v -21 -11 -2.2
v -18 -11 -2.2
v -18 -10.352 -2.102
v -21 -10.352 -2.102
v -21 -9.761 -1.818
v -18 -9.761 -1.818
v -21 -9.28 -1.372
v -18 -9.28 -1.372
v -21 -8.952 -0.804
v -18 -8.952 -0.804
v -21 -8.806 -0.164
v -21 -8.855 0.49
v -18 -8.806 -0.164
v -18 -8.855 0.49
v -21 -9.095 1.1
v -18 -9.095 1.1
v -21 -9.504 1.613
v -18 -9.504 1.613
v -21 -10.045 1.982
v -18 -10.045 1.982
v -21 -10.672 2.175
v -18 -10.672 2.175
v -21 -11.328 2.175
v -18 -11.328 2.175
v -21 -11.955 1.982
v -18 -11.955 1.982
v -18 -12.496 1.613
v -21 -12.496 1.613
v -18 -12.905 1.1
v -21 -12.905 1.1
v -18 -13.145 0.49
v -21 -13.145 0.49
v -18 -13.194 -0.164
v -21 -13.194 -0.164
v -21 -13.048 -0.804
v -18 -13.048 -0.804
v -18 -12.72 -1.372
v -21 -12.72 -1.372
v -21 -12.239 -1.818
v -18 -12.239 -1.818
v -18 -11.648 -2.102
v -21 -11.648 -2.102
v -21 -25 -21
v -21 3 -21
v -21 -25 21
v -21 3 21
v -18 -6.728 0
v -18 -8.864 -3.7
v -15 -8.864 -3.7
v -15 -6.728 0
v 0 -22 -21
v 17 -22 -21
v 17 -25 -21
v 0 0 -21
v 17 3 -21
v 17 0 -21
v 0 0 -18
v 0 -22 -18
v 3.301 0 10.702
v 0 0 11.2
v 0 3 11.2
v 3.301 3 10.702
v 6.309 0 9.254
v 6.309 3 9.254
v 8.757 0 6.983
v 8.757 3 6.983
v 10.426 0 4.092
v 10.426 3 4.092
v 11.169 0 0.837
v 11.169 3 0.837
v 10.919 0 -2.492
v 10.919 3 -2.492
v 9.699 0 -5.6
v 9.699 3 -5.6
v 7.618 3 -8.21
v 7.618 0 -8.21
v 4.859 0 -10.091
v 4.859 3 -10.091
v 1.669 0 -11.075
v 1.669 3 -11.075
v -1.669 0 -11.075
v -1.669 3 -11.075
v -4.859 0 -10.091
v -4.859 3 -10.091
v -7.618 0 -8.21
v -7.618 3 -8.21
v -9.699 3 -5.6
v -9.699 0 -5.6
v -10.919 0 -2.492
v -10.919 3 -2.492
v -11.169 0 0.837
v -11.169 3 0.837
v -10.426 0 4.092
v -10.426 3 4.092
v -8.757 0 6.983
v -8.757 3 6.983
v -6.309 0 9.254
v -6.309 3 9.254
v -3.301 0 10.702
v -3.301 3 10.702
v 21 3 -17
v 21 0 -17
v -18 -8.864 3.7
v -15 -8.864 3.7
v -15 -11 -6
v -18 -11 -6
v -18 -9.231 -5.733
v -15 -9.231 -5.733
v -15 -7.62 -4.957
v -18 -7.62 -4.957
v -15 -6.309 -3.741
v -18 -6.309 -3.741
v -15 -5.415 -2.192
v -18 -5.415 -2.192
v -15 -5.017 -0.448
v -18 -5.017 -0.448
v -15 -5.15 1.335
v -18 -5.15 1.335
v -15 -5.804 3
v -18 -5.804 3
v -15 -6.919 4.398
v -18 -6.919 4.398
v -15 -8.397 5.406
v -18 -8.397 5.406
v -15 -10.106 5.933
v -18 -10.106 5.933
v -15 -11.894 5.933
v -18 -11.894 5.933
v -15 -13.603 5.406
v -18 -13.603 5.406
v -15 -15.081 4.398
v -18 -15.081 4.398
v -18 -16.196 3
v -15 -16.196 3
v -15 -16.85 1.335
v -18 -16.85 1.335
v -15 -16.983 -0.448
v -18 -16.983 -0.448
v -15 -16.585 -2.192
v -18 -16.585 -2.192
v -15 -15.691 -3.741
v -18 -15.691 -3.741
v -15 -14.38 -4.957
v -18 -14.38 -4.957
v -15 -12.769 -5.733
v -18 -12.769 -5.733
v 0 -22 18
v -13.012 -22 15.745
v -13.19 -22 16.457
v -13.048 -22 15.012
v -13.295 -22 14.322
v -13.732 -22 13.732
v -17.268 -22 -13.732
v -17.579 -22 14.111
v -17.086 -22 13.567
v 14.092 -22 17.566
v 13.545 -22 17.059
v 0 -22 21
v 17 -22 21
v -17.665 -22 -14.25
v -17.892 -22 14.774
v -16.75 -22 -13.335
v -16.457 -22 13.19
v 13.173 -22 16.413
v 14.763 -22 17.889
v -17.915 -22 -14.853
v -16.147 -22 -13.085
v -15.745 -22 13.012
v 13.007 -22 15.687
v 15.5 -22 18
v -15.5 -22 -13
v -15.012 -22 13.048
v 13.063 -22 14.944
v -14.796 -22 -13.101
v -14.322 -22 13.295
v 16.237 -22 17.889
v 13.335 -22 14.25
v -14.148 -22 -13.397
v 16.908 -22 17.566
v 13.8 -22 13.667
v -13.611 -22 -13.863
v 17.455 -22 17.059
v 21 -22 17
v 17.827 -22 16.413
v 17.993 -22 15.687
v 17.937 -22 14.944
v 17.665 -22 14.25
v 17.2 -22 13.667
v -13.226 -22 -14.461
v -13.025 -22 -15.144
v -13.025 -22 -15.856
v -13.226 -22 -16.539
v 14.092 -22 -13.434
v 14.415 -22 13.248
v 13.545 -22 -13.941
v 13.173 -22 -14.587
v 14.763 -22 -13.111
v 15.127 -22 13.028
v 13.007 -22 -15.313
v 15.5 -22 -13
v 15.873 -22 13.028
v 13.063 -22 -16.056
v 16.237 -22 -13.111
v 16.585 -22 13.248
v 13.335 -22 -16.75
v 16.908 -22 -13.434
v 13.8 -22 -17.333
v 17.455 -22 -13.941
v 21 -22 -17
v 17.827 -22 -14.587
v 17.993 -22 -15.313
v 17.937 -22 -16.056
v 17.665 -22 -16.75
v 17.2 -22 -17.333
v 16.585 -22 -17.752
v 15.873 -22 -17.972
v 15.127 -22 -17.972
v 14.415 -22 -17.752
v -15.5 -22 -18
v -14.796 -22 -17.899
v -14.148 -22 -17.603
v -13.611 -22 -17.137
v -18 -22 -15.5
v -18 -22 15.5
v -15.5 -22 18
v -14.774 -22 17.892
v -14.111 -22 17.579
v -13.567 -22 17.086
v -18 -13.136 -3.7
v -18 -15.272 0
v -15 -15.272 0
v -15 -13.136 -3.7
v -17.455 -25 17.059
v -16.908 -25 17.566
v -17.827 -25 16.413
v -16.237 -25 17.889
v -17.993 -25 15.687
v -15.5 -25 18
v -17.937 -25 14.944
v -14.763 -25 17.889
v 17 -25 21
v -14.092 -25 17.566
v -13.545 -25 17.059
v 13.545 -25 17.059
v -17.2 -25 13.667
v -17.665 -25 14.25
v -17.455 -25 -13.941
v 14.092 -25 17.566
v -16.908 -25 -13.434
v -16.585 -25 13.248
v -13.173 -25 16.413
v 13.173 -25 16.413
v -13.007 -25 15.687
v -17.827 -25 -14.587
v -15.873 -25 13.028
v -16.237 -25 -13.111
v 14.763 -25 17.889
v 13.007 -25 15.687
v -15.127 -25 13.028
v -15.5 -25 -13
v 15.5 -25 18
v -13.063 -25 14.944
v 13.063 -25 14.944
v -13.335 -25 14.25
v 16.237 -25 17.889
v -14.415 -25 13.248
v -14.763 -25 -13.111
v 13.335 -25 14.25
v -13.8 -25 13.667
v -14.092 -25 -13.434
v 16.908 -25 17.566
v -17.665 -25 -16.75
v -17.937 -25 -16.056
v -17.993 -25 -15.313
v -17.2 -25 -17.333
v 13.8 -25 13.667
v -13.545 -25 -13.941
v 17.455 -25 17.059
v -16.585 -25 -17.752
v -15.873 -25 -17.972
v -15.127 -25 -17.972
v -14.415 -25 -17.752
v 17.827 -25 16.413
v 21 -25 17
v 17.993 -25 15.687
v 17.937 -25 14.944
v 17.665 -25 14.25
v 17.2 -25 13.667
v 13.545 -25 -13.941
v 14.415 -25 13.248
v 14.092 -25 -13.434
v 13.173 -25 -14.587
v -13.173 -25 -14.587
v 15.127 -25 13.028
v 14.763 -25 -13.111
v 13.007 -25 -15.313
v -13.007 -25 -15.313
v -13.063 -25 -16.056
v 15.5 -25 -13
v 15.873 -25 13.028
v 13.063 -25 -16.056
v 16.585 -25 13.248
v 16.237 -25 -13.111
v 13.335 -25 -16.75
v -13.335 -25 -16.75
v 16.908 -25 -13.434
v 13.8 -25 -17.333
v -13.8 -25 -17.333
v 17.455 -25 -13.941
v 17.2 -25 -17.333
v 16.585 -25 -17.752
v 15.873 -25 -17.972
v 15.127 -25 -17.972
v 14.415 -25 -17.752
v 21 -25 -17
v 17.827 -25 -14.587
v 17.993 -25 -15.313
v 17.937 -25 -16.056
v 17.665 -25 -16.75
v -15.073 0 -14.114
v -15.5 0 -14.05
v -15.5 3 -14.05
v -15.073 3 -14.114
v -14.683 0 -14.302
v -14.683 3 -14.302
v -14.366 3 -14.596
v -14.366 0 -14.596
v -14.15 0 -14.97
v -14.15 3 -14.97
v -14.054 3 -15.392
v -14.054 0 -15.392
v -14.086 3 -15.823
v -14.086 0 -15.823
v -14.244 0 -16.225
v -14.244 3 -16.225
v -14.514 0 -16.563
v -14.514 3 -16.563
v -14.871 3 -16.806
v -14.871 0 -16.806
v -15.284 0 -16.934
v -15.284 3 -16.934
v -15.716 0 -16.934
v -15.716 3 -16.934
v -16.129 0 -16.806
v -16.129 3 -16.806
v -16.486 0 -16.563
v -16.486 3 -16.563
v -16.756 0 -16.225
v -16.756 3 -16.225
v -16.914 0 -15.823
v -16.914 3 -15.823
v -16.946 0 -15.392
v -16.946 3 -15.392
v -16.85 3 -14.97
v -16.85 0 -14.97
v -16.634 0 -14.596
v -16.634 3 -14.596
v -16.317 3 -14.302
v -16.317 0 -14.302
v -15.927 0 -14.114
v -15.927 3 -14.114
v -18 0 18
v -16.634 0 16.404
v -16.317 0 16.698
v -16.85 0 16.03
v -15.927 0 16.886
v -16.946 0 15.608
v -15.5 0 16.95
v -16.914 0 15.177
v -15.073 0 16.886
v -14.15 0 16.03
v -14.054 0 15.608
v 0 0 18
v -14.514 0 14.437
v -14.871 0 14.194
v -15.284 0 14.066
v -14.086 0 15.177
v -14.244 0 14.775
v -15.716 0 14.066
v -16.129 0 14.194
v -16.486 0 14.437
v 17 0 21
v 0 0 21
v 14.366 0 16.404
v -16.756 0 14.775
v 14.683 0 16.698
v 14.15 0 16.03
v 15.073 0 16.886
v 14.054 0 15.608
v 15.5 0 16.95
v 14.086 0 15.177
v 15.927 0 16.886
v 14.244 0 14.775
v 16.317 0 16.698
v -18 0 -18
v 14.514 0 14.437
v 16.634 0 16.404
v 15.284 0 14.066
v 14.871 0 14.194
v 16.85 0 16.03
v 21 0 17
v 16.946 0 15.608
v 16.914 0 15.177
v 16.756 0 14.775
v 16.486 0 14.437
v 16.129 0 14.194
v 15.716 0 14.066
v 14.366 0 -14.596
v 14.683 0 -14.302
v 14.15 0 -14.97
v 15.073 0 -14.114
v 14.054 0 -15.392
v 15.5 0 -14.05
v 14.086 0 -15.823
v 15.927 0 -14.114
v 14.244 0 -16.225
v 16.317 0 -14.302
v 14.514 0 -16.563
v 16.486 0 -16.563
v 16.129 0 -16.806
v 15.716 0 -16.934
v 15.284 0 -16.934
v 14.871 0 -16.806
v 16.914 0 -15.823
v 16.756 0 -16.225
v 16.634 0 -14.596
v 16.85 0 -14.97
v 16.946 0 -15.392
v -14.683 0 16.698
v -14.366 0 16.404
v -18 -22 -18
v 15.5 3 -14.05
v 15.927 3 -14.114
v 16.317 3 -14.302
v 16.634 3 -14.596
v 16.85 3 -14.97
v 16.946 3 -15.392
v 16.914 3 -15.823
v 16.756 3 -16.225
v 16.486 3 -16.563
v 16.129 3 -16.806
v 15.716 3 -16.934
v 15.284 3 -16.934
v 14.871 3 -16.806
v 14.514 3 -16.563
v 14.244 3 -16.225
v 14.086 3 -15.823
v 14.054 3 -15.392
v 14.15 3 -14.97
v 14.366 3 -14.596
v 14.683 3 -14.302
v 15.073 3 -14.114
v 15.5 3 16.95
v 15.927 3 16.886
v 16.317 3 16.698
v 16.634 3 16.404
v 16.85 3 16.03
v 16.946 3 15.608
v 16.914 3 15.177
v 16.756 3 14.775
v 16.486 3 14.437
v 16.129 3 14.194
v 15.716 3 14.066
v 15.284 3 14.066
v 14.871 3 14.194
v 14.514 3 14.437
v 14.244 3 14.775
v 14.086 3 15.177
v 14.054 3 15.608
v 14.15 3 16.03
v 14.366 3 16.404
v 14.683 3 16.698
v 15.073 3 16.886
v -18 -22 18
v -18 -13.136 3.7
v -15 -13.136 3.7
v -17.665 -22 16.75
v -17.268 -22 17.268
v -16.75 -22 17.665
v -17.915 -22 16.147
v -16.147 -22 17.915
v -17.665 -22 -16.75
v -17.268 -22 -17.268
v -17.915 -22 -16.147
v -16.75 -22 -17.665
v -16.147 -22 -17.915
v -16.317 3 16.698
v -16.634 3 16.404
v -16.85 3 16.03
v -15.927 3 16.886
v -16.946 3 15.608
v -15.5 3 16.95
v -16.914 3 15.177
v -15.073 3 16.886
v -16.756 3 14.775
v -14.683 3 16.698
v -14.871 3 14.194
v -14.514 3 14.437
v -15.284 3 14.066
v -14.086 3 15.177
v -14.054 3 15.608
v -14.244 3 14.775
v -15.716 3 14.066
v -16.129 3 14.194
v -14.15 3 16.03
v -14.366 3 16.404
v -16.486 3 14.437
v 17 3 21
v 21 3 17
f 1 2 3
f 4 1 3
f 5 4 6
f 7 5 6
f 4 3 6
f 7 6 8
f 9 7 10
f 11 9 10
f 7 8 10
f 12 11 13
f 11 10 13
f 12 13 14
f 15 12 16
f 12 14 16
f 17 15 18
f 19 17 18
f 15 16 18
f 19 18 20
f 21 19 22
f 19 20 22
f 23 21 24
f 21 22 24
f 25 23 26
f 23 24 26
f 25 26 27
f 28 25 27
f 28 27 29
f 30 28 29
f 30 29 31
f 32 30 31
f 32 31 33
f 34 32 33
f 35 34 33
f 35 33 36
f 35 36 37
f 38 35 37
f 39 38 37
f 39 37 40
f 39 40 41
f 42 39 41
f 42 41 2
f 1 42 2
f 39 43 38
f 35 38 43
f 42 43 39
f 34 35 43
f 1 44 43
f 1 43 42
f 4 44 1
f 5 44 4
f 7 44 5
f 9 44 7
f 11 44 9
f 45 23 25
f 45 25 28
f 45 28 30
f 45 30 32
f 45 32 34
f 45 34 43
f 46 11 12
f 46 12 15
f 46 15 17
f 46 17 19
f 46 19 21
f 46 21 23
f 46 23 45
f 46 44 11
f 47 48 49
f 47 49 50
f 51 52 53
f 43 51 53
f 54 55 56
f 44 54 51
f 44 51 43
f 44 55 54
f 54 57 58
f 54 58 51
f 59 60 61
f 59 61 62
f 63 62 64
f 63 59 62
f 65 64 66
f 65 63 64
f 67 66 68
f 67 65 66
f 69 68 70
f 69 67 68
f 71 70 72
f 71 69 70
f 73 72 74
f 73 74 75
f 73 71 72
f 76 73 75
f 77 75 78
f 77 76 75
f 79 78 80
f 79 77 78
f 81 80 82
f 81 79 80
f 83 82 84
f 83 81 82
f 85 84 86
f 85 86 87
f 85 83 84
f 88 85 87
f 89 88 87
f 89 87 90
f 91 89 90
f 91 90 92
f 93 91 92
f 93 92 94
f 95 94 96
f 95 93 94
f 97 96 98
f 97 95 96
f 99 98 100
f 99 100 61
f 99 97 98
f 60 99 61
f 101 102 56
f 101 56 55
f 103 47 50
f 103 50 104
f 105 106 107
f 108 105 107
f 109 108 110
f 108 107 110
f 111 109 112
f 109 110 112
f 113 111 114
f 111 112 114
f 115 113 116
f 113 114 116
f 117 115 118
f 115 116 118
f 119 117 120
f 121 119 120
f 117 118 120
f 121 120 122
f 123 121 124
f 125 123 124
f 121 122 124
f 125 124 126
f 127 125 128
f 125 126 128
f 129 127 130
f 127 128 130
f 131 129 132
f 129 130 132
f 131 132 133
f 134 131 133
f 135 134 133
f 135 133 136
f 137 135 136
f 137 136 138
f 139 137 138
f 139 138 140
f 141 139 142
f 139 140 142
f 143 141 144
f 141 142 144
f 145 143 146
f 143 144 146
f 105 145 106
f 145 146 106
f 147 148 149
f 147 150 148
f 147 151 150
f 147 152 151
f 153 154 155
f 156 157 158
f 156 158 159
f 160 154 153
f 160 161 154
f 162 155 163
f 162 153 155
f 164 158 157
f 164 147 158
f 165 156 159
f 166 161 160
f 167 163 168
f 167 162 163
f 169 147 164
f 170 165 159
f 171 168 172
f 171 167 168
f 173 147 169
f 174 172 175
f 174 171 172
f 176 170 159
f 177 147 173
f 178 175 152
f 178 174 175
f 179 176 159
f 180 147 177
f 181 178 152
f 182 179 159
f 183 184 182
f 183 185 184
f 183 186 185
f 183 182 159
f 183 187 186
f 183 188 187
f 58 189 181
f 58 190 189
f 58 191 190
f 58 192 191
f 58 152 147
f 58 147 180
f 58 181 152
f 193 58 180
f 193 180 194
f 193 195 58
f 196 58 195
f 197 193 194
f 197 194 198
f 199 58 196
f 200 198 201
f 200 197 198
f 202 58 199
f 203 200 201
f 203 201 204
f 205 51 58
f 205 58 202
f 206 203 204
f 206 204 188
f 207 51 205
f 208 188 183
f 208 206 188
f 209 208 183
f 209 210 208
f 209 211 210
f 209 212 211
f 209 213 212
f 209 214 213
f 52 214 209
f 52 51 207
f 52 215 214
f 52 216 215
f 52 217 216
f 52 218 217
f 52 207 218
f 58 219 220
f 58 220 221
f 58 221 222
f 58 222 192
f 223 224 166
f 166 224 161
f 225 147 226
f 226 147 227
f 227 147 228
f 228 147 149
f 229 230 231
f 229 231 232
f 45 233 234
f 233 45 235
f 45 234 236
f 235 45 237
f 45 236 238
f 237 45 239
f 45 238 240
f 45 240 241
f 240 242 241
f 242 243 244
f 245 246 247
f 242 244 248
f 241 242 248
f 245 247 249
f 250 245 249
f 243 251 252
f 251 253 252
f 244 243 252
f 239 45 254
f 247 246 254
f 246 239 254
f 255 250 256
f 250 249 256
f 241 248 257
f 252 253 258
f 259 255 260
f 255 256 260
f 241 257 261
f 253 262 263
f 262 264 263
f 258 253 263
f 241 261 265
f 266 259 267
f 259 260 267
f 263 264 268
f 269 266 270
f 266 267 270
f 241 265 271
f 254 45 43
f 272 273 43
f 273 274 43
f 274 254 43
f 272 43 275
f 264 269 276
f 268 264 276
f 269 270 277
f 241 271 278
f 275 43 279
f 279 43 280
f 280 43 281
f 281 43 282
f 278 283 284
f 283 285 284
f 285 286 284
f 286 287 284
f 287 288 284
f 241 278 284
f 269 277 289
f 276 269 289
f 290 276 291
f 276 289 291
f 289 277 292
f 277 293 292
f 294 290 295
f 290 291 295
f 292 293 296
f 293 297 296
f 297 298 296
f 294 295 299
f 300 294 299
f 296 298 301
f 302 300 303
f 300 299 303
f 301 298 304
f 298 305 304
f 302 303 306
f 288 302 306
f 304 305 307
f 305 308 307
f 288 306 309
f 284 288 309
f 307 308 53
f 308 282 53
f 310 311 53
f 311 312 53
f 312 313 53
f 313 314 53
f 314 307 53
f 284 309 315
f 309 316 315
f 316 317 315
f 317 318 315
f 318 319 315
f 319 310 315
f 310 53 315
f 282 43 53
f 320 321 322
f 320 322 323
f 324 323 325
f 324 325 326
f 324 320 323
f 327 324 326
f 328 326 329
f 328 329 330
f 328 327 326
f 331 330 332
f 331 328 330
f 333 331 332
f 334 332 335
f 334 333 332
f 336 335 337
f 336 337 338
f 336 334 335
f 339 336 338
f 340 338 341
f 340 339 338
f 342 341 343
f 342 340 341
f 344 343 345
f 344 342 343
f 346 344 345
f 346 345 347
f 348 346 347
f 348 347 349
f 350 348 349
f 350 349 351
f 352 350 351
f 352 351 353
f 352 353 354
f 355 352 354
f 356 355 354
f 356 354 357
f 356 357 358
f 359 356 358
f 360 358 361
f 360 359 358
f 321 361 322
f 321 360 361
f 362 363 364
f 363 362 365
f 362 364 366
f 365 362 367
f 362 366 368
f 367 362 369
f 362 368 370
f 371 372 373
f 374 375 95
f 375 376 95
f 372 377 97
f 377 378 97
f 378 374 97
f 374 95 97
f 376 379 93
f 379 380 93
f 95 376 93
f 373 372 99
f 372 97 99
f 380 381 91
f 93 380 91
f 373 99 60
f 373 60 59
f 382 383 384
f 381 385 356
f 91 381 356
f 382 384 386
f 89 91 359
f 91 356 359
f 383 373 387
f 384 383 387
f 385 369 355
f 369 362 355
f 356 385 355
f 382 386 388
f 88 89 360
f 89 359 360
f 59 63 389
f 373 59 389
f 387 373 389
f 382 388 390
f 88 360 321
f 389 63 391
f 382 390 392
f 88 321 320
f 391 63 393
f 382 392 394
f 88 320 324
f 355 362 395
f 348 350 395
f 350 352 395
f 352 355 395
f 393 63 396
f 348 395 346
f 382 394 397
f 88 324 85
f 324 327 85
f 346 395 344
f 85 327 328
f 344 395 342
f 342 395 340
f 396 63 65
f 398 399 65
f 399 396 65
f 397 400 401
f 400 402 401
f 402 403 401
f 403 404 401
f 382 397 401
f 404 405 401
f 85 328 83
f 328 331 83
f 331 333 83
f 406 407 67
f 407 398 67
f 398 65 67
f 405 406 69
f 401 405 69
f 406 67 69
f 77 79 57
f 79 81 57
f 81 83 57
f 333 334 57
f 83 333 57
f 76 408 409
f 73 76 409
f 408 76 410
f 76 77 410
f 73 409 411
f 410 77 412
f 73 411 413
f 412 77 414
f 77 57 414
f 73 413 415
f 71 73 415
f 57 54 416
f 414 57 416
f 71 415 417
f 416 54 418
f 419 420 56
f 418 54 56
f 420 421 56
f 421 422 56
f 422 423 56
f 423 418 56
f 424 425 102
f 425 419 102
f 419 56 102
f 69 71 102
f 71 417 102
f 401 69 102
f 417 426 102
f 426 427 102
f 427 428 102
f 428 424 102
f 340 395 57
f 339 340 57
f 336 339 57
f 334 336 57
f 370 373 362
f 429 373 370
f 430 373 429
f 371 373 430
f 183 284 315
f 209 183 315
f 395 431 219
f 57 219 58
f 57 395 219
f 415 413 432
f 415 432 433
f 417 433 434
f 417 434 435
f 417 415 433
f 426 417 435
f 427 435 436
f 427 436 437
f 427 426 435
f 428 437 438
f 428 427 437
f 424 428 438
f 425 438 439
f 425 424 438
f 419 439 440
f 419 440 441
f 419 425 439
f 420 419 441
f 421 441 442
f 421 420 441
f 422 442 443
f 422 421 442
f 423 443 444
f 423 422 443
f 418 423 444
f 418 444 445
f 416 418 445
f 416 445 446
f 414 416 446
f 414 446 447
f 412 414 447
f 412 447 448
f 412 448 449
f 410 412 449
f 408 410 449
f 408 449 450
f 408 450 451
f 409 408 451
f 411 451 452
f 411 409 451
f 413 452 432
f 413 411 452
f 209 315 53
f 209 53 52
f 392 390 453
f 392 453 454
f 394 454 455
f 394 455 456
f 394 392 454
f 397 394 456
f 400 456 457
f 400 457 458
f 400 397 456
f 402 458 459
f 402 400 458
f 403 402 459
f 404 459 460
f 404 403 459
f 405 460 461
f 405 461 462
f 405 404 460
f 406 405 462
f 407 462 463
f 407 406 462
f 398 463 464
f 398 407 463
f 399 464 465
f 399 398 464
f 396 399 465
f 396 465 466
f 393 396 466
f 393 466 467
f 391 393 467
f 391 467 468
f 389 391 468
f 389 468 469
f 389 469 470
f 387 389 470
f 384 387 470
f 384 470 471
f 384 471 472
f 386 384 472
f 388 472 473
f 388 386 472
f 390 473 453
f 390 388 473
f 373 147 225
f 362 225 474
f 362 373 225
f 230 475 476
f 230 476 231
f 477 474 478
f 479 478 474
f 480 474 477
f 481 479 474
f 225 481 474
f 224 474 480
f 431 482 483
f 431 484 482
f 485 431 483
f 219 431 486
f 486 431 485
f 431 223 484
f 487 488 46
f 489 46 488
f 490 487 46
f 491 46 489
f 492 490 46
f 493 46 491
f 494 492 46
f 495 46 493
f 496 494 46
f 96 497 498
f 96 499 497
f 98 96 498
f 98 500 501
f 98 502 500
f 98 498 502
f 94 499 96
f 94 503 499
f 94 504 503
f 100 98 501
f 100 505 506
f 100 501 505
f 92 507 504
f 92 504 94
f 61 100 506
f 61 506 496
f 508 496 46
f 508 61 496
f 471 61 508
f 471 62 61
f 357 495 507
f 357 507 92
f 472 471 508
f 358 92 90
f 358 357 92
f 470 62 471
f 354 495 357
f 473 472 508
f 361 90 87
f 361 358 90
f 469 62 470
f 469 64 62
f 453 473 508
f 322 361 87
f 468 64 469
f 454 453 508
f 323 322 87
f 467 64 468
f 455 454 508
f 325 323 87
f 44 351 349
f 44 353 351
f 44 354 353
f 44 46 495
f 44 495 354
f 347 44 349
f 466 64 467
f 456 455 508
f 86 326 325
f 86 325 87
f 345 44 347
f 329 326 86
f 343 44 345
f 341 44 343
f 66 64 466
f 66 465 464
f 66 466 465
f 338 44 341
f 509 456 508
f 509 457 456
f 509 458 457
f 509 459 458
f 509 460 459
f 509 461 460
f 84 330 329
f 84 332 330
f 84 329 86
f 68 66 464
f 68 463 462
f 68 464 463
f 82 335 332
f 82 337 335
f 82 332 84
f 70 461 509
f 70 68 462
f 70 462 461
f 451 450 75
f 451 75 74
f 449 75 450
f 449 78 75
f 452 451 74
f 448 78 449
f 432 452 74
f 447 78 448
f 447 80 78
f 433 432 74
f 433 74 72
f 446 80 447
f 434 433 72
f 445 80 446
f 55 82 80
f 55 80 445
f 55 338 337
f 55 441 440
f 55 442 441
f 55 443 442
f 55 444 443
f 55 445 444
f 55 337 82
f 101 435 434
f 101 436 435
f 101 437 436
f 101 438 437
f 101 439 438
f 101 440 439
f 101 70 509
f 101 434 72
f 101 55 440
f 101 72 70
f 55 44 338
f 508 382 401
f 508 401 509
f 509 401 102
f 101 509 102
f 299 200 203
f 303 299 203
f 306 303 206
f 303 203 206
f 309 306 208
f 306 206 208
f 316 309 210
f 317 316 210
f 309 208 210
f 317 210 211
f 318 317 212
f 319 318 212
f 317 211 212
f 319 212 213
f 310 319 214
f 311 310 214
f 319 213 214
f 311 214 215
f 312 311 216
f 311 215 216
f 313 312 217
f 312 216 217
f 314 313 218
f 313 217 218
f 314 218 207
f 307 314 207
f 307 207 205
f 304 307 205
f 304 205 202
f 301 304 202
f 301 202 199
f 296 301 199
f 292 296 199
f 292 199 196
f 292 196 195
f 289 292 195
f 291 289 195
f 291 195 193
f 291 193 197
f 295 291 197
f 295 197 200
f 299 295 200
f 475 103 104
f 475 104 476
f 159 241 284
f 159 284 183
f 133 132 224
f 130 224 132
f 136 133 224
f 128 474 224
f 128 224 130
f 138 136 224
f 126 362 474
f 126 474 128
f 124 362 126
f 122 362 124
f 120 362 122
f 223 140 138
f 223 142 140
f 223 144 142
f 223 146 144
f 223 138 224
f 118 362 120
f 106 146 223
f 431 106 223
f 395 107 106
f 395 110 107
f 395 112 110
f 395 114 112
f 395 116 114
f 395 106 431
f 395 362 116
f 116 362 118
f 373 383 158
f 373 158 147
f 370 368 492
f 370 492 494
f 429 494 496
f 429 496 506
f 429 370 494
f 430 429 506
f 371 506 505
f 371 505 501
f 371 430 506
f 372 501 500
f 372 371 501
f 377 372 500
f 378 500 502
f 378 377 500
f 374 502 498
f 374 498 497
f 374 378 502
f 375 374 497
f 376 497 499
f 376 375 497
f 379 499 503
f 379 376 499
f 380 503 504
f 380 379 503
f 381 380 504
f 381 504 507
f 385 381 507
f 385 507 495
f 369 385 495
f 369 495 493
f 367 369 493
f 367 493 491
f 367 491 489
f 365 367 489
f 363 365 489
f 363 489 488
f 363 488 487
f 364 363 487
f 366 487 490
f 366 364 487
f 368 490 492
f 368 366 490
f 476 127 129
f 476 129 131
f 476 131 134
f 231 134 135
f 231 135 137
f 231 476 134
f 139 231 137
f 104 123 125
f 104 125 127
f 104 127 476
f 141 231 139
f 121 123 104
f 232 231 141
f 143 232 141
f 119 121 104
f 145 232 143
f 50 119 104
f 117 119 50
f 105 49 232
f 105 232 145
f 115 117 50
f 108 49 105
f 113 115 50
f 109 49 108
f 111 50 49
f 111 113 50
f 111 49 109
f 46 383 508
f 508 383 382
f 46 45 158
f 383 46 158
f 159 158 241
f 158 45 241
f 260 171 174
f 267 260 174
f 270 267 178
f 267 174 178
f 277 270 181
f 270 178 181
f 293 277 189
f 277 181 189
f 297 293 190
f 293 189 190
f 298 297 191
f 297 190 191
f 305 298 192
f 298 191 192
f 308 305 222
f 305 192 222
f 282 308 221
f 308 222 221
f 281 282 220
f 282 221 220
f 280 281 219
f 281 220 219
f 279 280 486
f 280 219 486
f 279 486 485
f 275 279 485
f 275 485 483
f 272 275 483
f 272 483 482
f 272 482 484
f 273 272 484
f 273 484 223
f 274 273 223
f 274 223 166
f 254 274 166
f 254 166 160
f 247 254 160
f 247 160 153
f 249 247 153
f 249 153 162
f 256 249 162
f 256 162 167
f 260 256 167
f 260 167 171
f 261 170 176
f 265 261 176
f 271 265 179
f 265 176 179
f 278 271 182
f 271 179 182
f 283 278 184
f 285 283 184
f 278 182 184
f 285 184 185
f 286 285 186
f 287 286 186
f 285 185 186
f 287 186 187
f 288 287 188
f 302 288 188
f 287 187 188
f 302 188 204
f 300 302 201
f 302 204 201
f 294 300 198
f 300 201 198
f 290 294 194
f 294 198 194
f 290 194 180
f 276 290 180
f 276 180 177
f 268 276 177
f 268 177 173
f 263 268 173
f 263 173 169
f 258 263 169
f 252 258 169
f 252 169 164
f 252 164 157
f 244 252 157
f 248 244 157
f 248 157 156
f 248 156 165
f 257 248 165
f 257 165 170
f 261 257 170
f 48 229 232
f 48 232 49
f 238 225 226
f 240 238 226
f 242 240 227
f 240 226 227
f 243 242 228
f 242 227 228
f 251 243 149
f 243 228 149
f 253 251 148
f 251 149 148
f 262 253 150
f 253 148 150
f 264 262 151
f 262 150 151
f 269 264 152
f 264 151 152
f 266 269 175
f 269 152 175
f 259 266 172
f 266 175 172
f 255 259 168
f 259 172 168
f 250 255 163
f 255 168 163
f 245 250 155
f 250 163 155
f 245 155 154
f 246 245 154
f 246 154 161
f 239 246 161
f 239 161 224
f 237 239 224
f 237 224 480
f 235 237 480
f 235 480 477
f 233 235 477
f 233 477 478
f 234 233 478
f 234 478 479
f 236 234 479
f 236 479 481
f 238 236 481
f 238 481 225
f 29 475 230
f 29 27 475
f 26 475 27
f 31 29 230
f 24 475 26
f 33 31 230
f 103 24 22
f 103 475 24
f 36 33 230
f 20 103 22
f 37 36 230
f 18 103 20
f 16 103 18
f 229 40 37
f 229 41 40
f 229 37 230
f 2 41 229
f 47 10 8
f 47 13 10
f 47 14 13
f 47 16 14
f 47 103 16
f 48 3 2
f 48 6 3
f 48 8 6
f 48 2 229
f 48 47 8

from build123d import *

# Parameters (mm, degrees)
SKETCH1_W           = 42
SKETCH1_H           = 42
SKETCH1_W_2         = 36
SKETCH1_H_2         = 36
SKETCH1_R           = 1.45
SKETCH1_R_2         = 11.2
BOSS_EXTRUDE1_DEPTH = 3
BOSS_EXTRUDE2_DEPTH = 25
BOSS_EXTRUDE3_START = -25
SKETCH1_4_W         = 36
SKETCH1_4_H         = 36
SKETCH1_4_R         = 1.45
SKETCH1_4_R_2       = 11.2
BOSS_EXTRUDE3_DEPTH = 3
SKETCH3_R           = 2.2
CUT_EXTRUDE1_DEPTH  = 51.862559904
SKETCH3_3_R         = 6
BOSS_EXTRUDE4_DEPTH = 3
SKETCH2_R           = 2.5
CUT_EXTRUDE2_DEPTH  = 39.820097888
CHAMFER1_SIZE       = 4


with BuildPart() as part:
    # Sketch1 → Boss-Extrude1 (new body)
    # profile 1 of 3: a face of its own
    with BuildSketch(Plane(origin=(0, 0, 0), x_dir=(1, 0, 0), z_dir=(0, 1, 0))):
        Rectangle(SKETCH1_W, SKETCH1_H)
        Rectangle(SKETCH1_W_2, SKETCH1_H_2, mode=Mode.SUBTRACT)
    # profile 2 of 3: a face of its own
    with BuildSketch(Plane(origin=(0, 0, 0), x_dir=(1, 0, 0), z_dir=(0, 1, 0))):
        Rectangle(SKETCH1_W_2, SKETCH1_H_2)
        with Locations(Location((-15.5, -15.5, 0), (0, 0, 270))):
            Circle(SKETCH1_R, mode=Mode.SUBTRACT)
        with Locations(Location((15.5, -15.5, 0), (0, 0, 270))):
            Circle(SKETCH1_R, mode=Mode.SUBTRACT)
        with Locations(Location((15.5, 15.5, 0), (0, 0, 270))):
            Circle(SKETCH1_R, mode=Mode.SUBTRACT)
        with Locations(Location((-15.5, 15.5, 0), (0, 0, 270))):
            Circle(SKETCH1_R, mode=Mode.SUBTRACT)
        with Locations(Location((0, 0, 0), (0, 0, 270))):
            Circle(SKETCH1_R_2, mode=Mode.SUBTRACT)
    # profile 3 of 3: a face of its own
    with BuildSketch(Plane(origin=(0, 0, 0), x_dir=(1, 0, 0), z_dir=(0, 1, 0))):
        Polygon((0, 18), (0, 21), (-21, 21), (-21, -21), (0, -21), (0, -18), (-18, -18), (-18, 18), align=None)
    extrude(amount=BOSS_EXTRUDE1_DEPTH)

    # Sketch1<3> → Boss-Extrude2 (add)
    with BuildSketch(Plane(origin=(0, 0, 0), x_dir=(1, 0, 0), z_dir=(0, 1, 0))):
        Polygon((0, 18), (0, 21), (-21, 21), (-21, -21), (0, -21), (0, -18), (-18, -18), (-18, 18), align=None)
    extrude(amount=-BOSS_EXTRUDE2_DEPTH)

    # Sketch1<4> → Boss-Extrude3 (add)
    # profile 1 of 8: a face of its own
    with BuildSketch(Plane(origin=(0, 0, 0), x_dir=(1, 0, 0), z_dir=(0, 1, 0)).offset(BOSS_EXTRUDE3_START)):
        Polygon((0, 18), (0, 21), (-21, 21), (-21, -21), (0, -21), (0, -18), (-18, -18), (-18, 18), align=None)
    # profile 2 of 8: a face of its own
    with BuildSketch(Plane(origin=(0, 0, 0), x_dir=(1, 0, 0), z_dir=(0, 1, 0)).offset(BOSS_EXTRUDE3_START)):
        Polygon((21, 21), (0, 21), (0, 18), (18, 18), (18, -18), (0, -18), (0, -21), (21, -21), align=None)
    # profile 3 of 8: a face of its own
    with BuildSketch(Plane(origin=(0, 0, 0), x_dir=(1, 0, 0), z_dir=(0, 1, 0)).offset(BOSS_EXTRUDE3_START)):
        Rectangle(SKETCH1_4_W, SKETCH1_4_H)
        with Locations(Location((-15.5, -15.5, 0), (0, 0, 270))):
            Circle(SKETCH1_4_R, mode=Mode.SUBTRACT)
        with Locations(Location((15.5, -15.5, 0), (0, 0, 270))):
            Circle(SKETCH1_4_R, mode=Mode.SUBTRACT)
        with Locations(Location((15.5, 15.5, 0), (0, 0, 270))):
            Circle(SKETCH1_4_R, mode=Mode.SUBTRACT)
        with Locations(Location((-15.5, 15.5, 0), (0, 0, 270))):
            Circle(SKETCH1_4_R, mode=Mode.SUBTRACT)
        with Locations(Location((0, 0, 0), (0, 0, 270))):
            Circle(SKETCH1_4_R_2, mode=Mode.SUBTRACT)
    # profile 4 of 8: a face of its own
    with BuildSketch(Plane(origin=(0, 0, 0), x_dir=(1, 0, 0), z_dir=(0, 1, 0)).offset(BOSS_EXTRUDE3_START)):
        with Locations(Location((-15.5, -15.5, 0), (0, 0, 270))):
            Circle(SKETCH1_4_R)
    # profile 5 of 8: a face of its own
    with BuildSketch(Plane(origin=(0, 0, 0), x_dir=(1, 0, 0), z_dir=(0, 1, 0)).offset(BOSS_EXTRUDE3_START)):
        with Locations(Location((15.5, -15.5, 0), (0, 0, 270))):
            Circle(SKETCH1_4_R)
    # profile 6 of 8: a face of its own
    with BuildSketch(Plane(origin=(0, 0, 0), x_dir=(1, 0, 0), z_dir=(0, 1, 0)).offset(BOSS_EXTRUDE3_START)):
        with Locations(Location((0, 0, 0), (0, 0, 270))):
            Circle(SKETCH1_4_R_2)
    # profile 7 of 8: a face of its own
    with BuildSketch(Plane(origin=(0, 0, 0), x_dir=(1, 0, 0), z_dir=(0, 1, 0)).offset(BOSS_EXTRUDE3_START)):
        with Locations(Location((-15.5, 15.5, 0), (0, 0, 270))):
            Circle(SKETCH1_4_R)
    # profile 8 of 8: a face of its own
    with BuildSketch(Plane(origin=(0, 0, 0), x_dir=(1, 0, 0), z_dir=(0, 1, 0)).offset(BOSS_EXTRUDE3_START)):
        with Locations(Location((15.5, 15.5, 0), (0, 0, 270))):
            Circle(SKETCH1_4_R)
    extrude(amount=BOSS_EXTRUDE3_DEPTH)

    # Sketch3 → Cut-Extrude1 (cut, through all)
    with BuildSketch(Plane(origin=(-18, 0, 0), x_dir=(0, 0, -1), z_dir=(1, 0, 0))):
        with Locations((0, -11)):
            Circle(SKETCH3_R)
    extrude(amount=-CUT_EXTRUDE1_DEPTH, mode=Mode.SUBTRACT)

    # Sketch3<3> → Boss-Extrude4 (add)
    with BuildSketch(Plane(origin=(-18, 0, 0), x_dir=(0, 0, -1), z_dir=(1, 0, 0))):
        with Locations((0, -11)):
            Circle(SKETCH3_3_R)
        Polygon((3.7, -8.863804004), (0, -6.727608008), (-3.7, -8.863804004), (-3.7, -13.136195996), (0, -15.272391992), (3.7, -13.136195996), align=None, mode=Mode.SUBTRACT)
    extrude(amount=BOSS_EXTRUDE4_DEPTH)

    # Sketch2 → Cut-Extrude2 (cut, through all)
    with BuildSketch(Plane(origin=(0, -22, 0), x_dir=(1, 0, 0), z_dir=(0, 1, 0))):
        with Locations(Location((15.5, 15.5, 0), (0, 0, 270))):
            Circle(SKETCH2_R)
        with Locations(Location((15.5, -15.5, 0), (0, 0, 270))):
            Circle(SKETCH2_R)
        with Locations(Location((-15.5, -15.5, 0), (0, 0, 270))):
            Circle(SKETCH2_R)
        with Locations(Location((-15.5, 15.5, 0), (0, 0, 270))):
            Circle(SKETCH2_R)
    extrude(amount=-CUT_EXTRUDE2_DEPTH, mode=Mode.SUBTRACT)

    # Chamfer1
    chamfer1_edges = [part.edges().sort_by_distance(p)[0] for p in [
        (21, 1.5, -21),
        (21, 1.5, 21),
        (21, -23.5, -21),
        (21, -23.5, 21),
    ]]
    chamfer(chamfer1_edges, length=CHAMFER1_SIZE)


solid = part.part
